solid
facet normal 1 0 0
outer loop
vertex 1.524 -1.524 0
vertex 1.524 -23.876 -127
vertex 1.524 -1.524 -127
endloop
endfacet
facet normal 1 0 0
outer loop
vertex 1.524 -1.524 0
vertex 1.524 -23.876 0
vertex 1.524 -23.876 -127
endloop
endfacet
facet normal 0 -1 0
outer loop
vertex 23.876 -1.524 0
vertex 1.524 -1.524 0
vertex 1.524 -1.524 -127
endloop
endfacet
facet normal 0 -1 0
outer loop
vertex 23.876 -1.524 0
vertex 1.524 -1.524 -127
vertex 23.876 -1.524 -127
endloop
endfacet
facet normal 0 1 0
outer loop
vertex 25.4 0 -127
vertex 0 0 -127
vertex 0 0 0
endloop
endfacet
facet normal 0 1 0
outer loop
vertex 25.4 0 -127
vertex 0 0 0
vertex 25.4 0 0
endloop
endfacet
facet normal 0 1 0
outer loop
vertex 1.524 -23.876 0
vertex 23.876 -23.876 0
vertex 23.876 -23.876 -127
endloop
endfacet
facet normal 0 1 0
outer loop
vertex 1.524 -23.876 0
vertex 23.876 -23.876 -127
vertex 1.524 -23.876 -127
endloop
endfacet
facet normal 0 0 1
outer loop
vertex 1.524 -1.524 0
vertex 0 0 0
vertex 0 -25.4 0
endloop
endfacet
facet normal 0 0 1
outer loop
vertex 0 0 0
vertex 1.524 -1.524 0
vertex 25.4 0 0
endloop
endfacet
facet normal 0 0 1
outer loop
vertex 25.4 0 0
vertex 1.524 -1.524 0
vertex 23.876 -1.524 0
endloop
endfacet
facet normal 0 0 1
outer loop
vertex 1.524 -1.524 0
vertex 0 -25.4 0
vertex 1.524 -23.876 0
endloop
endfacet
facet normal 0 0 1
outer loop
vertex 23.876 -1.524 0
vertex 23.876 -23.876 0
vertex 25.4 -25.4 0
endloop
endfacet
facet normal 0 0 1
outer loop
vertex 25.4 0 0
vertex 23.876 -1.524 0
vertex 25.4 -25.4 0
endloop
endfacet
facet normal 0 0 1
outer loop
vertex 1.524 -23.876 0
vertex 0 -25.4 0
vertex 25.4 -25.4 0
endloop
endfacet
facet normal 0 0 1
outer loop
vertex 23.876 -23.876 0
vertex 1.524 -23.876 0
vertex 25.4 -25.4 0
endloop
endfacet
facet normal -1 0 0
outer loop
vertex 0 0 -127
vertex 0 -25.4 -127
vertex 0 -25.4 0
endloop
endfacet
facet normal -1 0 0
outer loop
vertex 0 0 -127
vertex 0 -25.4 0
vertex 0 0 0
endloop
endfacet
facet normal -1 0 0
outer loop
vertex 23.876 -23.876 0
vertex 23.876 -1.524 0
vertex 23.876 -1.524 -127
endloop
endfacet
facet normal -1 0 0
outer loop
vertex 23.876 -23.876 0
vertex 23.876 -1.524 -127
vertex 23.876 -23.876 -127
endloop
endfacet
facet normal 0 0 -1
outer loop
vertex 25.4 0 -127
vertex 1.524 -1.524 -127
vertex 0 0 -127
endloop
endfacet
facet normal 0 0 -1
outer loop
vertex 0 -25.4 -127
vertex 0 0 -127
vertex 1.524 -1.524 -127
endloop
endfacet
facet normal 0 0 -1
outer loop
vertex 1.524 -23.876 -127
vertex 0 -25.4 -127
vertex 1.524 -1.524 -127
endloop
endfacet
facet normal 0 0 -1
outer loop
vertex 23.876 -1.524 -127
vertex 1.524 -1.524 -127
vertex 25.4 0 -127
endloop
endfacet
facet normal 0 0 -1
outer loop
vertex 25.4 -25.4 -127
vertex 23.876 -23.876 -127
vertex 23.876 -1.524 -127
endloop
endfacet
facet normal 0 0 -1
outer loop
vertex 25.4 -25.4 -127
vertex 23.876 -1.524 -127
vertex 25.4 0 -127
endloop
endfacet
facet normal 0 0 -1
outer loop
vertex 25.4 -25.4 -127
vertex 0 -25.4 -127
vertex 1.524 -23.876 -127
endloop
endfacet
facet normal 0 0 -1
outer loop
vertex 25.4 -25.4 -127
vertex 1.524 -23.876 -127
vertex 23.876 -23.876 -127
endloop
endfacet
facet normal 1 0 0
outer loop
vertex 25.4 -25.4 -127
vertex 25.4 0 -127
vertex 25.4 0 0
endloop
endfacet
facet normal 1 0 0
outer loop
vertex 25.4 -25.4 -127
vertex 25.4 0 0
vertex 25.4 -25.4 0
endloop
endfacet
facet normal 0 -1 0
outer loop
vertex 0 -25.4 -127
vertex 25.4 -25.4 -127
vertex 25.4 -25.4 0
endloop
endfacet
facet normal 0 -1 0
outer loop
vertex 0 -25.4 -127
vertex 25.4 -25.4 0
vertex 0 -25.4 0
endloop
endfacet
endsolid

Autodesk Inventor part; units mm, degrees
ref_plane "YZ Plane" through (0, 0, 0) normal (1, 0, 0) x (0, 1, 0)
ref_plane "XZ Plane" through (0, 0, 0) normal (0, 1, 0) x (-1, 0, 0)
sketch "Sketch1" plane through (0, 0, 0) normal (0, 0, 1) x (1, 0, 0)
  line L0 (0, 0) -> (25.4, 0)
  line L1 (25.4, 0) -> (25.4, -25.4)
  line L2 (25.4, -25.4) -> (0, -25.4)
  line L3 (0, -25.4) -> (0, 0)
  dimension "d0" = 25.4
  dimension "d1" = 25.4
ref_plane "Work Plane1" through (0, 0, 0) normal (0, 0, -1) x (1, 0, 0)
sketch "Sketch2" plane through (0, 0, 0) normal (0, 0, -1) x (1, 0, 0)
  line L0 (1.524, 1.524) -> (23.876, 1.524)
  line L1 (23.876, 1.524) -> (23.876, 23.876)
  line L2 (23.876, 23.876) -> (1.524, 23.876)
  line L3 (1.524, 23.876) -> (1.524, 1.524)
  line L4 (0, 25.4) -> (0, 0) projected
  line L5 (0, 0) -> (25.4, 0) projected
  line L6 (25.4, 25.4) -> (0, 25.4) projected
  line L7 (25.4, 0) -> (25.4, 25.4) projected
  dimension "margin" = 1.524
  dimension "d3" = 1.524
  dimension "d4" = 1.524
  dimension "d5" = 1.524
extrude "Extrusion1" add sketch "Sketch2" along normal blind 127
equation "\"d3\" = margin"
equation "\"d4\" = margin"
equation "\"d5\" = margin"
properties part number "latch mount point"
